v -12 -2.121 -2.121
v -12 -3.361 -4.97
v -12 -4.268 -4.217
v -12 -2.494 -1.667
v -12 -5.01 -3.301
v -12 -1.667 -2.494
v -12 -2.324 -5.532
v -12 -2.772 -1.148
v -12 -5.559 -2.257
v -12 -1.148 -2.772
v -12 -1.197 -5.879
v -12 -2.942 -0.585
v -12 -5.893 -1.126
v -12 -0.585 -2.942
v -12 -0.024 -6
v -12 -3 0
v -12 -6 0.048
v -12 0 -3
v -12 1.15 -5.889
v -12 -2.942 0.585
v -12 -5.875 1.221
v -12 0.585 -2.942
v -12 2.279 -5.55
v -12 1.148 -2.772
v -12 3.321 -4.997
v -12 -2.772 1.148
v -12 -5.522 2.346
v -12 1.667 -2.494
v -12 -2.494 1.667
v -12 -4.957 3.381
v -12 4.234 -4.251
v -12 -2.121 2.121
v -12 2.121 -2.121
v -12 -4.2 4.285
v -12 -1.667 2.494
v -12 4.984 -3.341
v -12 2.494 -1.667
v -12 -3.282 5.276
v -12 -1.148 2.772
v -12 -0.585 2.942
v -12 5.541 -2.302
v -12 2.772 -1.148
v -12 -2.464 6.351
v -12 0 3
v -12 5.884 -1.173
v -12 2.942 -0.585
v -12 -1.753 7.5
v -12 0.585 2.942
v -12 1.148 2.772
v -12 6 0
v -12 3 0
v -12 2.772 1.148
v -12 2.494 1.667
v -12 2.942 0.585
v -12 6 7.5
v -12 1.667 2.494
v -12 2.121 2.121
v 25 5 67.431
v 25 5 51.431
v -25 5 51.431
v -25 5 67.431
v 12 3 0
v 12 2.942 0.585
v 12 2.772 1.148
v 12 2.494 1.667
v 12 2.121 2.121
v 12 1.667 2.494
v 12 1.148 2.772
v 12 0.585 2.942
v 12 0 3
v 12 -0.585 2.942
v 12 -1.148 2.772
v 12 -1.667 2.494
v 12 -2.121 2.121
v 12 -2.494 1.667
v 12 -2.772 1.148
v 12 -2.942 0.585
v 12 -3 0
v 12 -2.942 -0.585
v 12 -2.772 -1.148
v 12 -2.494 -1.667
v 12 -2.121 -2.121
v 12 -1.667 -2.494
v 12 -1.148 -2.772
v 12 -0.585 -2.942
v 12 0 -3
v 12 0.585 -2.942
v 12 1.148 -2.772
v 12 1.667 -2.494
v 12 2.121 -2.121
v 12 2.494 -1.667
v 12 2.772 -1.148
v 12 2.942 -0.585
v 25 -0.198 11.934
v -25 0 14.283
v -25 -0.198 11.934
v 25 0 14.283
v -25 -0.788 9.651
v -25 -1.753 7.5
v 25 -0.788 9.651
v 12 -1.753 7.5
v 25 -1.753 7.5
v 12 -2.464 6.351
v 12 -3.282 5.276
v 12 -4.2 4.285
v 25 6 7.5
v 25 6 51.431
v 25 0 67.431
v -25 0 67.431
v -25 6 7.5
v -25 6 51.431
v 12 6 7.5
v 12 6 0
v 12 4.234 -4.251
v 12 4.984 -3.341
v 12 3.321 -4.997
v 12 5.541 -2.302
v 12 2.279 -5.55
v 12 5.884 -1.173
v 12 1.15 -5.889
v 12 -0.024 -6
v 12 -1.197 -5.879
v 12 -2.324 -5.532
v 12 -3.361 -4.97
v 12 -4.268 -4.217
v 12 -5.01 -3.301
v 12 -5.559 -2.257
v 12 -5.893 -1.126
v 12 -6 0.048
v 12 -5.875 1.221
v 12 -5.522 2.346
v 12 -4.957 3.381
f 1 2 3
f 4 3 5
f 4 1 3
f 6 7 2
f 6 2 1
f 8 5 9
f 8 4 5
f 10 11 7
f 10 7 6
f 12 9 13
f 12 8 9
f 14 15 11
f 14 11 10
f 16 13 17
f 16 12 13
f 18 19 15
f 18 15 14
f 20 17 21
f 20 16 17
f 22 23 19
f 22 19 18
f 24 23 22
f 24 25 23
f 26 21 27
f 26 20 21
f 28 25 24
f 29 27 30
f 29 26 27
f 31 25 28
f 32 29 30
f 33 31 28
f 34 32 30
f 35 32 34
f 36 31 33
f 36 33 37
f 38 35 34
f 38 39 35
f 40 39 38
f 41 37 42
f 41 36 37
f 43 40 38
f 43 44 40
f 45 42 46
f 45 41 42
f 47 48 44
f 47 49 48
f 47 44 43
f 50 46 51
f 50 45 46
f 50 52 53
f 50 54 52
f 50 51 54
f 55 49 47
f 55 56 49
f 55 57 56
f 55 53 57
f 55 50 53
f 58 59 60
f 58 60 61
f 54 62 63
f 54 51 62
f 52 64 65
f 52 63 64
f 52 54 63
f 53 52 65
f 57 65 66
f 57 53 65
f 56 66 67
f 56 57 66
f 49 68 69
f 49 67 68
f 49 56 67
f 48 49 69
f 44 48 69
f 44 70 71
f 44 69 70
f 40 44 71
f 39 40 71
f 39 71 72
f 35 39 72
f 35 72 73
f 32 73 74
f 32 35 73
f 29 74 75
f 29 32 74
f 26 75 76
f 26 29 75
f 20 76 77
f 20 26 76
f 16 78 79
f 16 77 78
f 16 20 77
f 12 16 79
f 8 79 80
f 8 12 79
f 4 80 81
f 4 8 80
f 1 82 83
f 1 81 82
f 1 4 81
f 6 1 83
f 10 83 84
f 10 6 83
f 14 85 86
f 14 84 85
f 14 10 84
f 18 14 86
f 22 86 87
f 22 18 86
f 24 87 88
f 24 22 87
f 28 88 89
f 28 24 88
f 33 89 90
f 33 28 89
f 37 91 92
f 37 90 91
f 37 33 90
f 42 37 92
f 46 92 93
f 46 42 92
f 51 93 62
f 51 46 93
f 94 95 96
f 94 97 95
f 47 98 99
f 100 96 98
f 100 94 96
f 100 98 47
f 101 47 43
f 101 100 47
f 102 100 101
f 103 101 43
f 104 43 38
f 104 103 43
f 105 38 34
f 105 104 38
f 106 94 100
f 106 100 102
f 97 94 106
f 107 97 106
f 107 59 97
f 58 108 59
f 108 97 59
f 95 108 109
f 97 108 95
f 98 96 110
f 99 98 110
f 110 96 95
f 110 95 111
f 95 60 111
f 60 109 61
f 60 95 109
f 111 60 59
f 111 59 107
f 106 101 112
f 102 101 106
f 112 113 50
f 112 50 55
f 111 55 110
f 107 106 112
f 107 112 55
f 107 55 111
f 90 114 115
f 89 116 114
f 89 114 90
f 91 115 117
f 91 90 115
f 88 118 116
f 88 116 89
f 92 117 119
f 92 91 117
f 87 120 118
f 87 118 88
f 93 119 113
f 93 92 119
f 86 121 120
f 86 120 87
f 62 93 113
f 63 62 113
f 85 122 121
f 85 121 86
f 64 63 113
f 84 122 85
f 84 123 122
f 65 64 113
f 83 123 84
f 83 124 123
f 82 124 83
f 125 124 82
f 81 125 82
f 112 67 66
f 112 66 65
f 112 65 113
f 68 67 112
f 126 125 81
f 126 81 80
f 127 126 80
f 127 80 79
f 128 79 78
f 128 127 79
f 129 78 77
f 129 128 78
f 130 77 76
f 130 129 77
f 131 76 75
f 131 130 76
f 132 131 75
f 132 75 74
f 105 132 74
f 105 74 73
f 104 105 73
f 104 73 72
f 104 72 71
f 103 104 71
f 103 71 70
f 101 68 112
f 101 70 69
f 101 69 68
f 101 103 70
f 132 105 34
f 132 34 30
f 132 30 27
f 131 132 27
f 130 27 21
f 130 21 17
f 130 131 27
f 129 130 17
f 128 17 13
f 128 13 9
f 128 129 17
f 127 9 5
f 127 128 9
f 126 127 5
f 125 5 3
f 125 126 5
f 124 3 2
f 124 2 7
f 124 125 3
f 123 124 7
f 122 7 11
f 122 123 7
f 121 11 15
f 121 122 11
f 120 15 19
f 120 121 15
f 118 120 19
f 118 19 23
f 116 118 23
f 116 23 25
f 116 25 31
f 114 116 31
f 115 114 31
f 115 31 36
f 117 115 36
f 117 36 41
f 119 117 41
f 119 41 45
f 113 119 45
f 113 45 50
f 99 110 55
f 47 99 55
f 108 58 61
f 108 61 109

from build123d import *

# Parameters (mm, degrees)
F0_R     = 3
F1_DEPTH = 25
F2_W     = 13
F2_H     = 15
F3_DEPTH = 12.5
F4_W     = 1
F4_H     = 16
F5_DEPTH = 30
F6_R     = 14


with BuildPart() as f1:
    # F0 (on Right) → F1 (new body, symmetric)
    with BuildSketch(Plane.YZ):
        with BuildLine():
            Line((-3e-06, 67.431174), (-3e-06, 6))
            ThreePointArc((-3e-06, 6), (-4.242643, -4.242641), (5.999997, 0))
            Line((5.999997, 0), (5.999997, 67.431174))
            Line((5.999997, 67.431174), (-3e-06, 67.431174))
        make_face()
        with Locations((-3e-06, 0)):
            Circle(F0_R, mode=Mode.SUBTRACT)
    extrude(amount=F1_DEPTH, both=True)

    # F2 (on Front) → F3 (cut, symmetric)
    with BuildSketch(Plane.XZ):
        with Locations((-18.5, 0)):
            Rectangle(F2_W, F2_H)
        with Locations((18.5, 0)):
            Rectangle(F2_W, F2_H)
    extrude(amount=F3_DEPTH, both=True, mode=Mode.SUBTRACT)

    # F4 (on Right) → F5 (cut, symmetric)
    with BuildSketch(Plane.YZ):
        with Locations((5.499997, 59.431174)):
            Rectangle(F4_W, F4_H)
    extrude(amount=F5_DEPTH, both=True, mode=Mode.SUBTRACT)

    # F6
    f6_edges = [f1.edges().sort_by_distance(p)[0] for p in [
        (0, -3e-06, 6),
    ]]
    fillet(f6_edges, radius=F6_R)


solid = f1.part
